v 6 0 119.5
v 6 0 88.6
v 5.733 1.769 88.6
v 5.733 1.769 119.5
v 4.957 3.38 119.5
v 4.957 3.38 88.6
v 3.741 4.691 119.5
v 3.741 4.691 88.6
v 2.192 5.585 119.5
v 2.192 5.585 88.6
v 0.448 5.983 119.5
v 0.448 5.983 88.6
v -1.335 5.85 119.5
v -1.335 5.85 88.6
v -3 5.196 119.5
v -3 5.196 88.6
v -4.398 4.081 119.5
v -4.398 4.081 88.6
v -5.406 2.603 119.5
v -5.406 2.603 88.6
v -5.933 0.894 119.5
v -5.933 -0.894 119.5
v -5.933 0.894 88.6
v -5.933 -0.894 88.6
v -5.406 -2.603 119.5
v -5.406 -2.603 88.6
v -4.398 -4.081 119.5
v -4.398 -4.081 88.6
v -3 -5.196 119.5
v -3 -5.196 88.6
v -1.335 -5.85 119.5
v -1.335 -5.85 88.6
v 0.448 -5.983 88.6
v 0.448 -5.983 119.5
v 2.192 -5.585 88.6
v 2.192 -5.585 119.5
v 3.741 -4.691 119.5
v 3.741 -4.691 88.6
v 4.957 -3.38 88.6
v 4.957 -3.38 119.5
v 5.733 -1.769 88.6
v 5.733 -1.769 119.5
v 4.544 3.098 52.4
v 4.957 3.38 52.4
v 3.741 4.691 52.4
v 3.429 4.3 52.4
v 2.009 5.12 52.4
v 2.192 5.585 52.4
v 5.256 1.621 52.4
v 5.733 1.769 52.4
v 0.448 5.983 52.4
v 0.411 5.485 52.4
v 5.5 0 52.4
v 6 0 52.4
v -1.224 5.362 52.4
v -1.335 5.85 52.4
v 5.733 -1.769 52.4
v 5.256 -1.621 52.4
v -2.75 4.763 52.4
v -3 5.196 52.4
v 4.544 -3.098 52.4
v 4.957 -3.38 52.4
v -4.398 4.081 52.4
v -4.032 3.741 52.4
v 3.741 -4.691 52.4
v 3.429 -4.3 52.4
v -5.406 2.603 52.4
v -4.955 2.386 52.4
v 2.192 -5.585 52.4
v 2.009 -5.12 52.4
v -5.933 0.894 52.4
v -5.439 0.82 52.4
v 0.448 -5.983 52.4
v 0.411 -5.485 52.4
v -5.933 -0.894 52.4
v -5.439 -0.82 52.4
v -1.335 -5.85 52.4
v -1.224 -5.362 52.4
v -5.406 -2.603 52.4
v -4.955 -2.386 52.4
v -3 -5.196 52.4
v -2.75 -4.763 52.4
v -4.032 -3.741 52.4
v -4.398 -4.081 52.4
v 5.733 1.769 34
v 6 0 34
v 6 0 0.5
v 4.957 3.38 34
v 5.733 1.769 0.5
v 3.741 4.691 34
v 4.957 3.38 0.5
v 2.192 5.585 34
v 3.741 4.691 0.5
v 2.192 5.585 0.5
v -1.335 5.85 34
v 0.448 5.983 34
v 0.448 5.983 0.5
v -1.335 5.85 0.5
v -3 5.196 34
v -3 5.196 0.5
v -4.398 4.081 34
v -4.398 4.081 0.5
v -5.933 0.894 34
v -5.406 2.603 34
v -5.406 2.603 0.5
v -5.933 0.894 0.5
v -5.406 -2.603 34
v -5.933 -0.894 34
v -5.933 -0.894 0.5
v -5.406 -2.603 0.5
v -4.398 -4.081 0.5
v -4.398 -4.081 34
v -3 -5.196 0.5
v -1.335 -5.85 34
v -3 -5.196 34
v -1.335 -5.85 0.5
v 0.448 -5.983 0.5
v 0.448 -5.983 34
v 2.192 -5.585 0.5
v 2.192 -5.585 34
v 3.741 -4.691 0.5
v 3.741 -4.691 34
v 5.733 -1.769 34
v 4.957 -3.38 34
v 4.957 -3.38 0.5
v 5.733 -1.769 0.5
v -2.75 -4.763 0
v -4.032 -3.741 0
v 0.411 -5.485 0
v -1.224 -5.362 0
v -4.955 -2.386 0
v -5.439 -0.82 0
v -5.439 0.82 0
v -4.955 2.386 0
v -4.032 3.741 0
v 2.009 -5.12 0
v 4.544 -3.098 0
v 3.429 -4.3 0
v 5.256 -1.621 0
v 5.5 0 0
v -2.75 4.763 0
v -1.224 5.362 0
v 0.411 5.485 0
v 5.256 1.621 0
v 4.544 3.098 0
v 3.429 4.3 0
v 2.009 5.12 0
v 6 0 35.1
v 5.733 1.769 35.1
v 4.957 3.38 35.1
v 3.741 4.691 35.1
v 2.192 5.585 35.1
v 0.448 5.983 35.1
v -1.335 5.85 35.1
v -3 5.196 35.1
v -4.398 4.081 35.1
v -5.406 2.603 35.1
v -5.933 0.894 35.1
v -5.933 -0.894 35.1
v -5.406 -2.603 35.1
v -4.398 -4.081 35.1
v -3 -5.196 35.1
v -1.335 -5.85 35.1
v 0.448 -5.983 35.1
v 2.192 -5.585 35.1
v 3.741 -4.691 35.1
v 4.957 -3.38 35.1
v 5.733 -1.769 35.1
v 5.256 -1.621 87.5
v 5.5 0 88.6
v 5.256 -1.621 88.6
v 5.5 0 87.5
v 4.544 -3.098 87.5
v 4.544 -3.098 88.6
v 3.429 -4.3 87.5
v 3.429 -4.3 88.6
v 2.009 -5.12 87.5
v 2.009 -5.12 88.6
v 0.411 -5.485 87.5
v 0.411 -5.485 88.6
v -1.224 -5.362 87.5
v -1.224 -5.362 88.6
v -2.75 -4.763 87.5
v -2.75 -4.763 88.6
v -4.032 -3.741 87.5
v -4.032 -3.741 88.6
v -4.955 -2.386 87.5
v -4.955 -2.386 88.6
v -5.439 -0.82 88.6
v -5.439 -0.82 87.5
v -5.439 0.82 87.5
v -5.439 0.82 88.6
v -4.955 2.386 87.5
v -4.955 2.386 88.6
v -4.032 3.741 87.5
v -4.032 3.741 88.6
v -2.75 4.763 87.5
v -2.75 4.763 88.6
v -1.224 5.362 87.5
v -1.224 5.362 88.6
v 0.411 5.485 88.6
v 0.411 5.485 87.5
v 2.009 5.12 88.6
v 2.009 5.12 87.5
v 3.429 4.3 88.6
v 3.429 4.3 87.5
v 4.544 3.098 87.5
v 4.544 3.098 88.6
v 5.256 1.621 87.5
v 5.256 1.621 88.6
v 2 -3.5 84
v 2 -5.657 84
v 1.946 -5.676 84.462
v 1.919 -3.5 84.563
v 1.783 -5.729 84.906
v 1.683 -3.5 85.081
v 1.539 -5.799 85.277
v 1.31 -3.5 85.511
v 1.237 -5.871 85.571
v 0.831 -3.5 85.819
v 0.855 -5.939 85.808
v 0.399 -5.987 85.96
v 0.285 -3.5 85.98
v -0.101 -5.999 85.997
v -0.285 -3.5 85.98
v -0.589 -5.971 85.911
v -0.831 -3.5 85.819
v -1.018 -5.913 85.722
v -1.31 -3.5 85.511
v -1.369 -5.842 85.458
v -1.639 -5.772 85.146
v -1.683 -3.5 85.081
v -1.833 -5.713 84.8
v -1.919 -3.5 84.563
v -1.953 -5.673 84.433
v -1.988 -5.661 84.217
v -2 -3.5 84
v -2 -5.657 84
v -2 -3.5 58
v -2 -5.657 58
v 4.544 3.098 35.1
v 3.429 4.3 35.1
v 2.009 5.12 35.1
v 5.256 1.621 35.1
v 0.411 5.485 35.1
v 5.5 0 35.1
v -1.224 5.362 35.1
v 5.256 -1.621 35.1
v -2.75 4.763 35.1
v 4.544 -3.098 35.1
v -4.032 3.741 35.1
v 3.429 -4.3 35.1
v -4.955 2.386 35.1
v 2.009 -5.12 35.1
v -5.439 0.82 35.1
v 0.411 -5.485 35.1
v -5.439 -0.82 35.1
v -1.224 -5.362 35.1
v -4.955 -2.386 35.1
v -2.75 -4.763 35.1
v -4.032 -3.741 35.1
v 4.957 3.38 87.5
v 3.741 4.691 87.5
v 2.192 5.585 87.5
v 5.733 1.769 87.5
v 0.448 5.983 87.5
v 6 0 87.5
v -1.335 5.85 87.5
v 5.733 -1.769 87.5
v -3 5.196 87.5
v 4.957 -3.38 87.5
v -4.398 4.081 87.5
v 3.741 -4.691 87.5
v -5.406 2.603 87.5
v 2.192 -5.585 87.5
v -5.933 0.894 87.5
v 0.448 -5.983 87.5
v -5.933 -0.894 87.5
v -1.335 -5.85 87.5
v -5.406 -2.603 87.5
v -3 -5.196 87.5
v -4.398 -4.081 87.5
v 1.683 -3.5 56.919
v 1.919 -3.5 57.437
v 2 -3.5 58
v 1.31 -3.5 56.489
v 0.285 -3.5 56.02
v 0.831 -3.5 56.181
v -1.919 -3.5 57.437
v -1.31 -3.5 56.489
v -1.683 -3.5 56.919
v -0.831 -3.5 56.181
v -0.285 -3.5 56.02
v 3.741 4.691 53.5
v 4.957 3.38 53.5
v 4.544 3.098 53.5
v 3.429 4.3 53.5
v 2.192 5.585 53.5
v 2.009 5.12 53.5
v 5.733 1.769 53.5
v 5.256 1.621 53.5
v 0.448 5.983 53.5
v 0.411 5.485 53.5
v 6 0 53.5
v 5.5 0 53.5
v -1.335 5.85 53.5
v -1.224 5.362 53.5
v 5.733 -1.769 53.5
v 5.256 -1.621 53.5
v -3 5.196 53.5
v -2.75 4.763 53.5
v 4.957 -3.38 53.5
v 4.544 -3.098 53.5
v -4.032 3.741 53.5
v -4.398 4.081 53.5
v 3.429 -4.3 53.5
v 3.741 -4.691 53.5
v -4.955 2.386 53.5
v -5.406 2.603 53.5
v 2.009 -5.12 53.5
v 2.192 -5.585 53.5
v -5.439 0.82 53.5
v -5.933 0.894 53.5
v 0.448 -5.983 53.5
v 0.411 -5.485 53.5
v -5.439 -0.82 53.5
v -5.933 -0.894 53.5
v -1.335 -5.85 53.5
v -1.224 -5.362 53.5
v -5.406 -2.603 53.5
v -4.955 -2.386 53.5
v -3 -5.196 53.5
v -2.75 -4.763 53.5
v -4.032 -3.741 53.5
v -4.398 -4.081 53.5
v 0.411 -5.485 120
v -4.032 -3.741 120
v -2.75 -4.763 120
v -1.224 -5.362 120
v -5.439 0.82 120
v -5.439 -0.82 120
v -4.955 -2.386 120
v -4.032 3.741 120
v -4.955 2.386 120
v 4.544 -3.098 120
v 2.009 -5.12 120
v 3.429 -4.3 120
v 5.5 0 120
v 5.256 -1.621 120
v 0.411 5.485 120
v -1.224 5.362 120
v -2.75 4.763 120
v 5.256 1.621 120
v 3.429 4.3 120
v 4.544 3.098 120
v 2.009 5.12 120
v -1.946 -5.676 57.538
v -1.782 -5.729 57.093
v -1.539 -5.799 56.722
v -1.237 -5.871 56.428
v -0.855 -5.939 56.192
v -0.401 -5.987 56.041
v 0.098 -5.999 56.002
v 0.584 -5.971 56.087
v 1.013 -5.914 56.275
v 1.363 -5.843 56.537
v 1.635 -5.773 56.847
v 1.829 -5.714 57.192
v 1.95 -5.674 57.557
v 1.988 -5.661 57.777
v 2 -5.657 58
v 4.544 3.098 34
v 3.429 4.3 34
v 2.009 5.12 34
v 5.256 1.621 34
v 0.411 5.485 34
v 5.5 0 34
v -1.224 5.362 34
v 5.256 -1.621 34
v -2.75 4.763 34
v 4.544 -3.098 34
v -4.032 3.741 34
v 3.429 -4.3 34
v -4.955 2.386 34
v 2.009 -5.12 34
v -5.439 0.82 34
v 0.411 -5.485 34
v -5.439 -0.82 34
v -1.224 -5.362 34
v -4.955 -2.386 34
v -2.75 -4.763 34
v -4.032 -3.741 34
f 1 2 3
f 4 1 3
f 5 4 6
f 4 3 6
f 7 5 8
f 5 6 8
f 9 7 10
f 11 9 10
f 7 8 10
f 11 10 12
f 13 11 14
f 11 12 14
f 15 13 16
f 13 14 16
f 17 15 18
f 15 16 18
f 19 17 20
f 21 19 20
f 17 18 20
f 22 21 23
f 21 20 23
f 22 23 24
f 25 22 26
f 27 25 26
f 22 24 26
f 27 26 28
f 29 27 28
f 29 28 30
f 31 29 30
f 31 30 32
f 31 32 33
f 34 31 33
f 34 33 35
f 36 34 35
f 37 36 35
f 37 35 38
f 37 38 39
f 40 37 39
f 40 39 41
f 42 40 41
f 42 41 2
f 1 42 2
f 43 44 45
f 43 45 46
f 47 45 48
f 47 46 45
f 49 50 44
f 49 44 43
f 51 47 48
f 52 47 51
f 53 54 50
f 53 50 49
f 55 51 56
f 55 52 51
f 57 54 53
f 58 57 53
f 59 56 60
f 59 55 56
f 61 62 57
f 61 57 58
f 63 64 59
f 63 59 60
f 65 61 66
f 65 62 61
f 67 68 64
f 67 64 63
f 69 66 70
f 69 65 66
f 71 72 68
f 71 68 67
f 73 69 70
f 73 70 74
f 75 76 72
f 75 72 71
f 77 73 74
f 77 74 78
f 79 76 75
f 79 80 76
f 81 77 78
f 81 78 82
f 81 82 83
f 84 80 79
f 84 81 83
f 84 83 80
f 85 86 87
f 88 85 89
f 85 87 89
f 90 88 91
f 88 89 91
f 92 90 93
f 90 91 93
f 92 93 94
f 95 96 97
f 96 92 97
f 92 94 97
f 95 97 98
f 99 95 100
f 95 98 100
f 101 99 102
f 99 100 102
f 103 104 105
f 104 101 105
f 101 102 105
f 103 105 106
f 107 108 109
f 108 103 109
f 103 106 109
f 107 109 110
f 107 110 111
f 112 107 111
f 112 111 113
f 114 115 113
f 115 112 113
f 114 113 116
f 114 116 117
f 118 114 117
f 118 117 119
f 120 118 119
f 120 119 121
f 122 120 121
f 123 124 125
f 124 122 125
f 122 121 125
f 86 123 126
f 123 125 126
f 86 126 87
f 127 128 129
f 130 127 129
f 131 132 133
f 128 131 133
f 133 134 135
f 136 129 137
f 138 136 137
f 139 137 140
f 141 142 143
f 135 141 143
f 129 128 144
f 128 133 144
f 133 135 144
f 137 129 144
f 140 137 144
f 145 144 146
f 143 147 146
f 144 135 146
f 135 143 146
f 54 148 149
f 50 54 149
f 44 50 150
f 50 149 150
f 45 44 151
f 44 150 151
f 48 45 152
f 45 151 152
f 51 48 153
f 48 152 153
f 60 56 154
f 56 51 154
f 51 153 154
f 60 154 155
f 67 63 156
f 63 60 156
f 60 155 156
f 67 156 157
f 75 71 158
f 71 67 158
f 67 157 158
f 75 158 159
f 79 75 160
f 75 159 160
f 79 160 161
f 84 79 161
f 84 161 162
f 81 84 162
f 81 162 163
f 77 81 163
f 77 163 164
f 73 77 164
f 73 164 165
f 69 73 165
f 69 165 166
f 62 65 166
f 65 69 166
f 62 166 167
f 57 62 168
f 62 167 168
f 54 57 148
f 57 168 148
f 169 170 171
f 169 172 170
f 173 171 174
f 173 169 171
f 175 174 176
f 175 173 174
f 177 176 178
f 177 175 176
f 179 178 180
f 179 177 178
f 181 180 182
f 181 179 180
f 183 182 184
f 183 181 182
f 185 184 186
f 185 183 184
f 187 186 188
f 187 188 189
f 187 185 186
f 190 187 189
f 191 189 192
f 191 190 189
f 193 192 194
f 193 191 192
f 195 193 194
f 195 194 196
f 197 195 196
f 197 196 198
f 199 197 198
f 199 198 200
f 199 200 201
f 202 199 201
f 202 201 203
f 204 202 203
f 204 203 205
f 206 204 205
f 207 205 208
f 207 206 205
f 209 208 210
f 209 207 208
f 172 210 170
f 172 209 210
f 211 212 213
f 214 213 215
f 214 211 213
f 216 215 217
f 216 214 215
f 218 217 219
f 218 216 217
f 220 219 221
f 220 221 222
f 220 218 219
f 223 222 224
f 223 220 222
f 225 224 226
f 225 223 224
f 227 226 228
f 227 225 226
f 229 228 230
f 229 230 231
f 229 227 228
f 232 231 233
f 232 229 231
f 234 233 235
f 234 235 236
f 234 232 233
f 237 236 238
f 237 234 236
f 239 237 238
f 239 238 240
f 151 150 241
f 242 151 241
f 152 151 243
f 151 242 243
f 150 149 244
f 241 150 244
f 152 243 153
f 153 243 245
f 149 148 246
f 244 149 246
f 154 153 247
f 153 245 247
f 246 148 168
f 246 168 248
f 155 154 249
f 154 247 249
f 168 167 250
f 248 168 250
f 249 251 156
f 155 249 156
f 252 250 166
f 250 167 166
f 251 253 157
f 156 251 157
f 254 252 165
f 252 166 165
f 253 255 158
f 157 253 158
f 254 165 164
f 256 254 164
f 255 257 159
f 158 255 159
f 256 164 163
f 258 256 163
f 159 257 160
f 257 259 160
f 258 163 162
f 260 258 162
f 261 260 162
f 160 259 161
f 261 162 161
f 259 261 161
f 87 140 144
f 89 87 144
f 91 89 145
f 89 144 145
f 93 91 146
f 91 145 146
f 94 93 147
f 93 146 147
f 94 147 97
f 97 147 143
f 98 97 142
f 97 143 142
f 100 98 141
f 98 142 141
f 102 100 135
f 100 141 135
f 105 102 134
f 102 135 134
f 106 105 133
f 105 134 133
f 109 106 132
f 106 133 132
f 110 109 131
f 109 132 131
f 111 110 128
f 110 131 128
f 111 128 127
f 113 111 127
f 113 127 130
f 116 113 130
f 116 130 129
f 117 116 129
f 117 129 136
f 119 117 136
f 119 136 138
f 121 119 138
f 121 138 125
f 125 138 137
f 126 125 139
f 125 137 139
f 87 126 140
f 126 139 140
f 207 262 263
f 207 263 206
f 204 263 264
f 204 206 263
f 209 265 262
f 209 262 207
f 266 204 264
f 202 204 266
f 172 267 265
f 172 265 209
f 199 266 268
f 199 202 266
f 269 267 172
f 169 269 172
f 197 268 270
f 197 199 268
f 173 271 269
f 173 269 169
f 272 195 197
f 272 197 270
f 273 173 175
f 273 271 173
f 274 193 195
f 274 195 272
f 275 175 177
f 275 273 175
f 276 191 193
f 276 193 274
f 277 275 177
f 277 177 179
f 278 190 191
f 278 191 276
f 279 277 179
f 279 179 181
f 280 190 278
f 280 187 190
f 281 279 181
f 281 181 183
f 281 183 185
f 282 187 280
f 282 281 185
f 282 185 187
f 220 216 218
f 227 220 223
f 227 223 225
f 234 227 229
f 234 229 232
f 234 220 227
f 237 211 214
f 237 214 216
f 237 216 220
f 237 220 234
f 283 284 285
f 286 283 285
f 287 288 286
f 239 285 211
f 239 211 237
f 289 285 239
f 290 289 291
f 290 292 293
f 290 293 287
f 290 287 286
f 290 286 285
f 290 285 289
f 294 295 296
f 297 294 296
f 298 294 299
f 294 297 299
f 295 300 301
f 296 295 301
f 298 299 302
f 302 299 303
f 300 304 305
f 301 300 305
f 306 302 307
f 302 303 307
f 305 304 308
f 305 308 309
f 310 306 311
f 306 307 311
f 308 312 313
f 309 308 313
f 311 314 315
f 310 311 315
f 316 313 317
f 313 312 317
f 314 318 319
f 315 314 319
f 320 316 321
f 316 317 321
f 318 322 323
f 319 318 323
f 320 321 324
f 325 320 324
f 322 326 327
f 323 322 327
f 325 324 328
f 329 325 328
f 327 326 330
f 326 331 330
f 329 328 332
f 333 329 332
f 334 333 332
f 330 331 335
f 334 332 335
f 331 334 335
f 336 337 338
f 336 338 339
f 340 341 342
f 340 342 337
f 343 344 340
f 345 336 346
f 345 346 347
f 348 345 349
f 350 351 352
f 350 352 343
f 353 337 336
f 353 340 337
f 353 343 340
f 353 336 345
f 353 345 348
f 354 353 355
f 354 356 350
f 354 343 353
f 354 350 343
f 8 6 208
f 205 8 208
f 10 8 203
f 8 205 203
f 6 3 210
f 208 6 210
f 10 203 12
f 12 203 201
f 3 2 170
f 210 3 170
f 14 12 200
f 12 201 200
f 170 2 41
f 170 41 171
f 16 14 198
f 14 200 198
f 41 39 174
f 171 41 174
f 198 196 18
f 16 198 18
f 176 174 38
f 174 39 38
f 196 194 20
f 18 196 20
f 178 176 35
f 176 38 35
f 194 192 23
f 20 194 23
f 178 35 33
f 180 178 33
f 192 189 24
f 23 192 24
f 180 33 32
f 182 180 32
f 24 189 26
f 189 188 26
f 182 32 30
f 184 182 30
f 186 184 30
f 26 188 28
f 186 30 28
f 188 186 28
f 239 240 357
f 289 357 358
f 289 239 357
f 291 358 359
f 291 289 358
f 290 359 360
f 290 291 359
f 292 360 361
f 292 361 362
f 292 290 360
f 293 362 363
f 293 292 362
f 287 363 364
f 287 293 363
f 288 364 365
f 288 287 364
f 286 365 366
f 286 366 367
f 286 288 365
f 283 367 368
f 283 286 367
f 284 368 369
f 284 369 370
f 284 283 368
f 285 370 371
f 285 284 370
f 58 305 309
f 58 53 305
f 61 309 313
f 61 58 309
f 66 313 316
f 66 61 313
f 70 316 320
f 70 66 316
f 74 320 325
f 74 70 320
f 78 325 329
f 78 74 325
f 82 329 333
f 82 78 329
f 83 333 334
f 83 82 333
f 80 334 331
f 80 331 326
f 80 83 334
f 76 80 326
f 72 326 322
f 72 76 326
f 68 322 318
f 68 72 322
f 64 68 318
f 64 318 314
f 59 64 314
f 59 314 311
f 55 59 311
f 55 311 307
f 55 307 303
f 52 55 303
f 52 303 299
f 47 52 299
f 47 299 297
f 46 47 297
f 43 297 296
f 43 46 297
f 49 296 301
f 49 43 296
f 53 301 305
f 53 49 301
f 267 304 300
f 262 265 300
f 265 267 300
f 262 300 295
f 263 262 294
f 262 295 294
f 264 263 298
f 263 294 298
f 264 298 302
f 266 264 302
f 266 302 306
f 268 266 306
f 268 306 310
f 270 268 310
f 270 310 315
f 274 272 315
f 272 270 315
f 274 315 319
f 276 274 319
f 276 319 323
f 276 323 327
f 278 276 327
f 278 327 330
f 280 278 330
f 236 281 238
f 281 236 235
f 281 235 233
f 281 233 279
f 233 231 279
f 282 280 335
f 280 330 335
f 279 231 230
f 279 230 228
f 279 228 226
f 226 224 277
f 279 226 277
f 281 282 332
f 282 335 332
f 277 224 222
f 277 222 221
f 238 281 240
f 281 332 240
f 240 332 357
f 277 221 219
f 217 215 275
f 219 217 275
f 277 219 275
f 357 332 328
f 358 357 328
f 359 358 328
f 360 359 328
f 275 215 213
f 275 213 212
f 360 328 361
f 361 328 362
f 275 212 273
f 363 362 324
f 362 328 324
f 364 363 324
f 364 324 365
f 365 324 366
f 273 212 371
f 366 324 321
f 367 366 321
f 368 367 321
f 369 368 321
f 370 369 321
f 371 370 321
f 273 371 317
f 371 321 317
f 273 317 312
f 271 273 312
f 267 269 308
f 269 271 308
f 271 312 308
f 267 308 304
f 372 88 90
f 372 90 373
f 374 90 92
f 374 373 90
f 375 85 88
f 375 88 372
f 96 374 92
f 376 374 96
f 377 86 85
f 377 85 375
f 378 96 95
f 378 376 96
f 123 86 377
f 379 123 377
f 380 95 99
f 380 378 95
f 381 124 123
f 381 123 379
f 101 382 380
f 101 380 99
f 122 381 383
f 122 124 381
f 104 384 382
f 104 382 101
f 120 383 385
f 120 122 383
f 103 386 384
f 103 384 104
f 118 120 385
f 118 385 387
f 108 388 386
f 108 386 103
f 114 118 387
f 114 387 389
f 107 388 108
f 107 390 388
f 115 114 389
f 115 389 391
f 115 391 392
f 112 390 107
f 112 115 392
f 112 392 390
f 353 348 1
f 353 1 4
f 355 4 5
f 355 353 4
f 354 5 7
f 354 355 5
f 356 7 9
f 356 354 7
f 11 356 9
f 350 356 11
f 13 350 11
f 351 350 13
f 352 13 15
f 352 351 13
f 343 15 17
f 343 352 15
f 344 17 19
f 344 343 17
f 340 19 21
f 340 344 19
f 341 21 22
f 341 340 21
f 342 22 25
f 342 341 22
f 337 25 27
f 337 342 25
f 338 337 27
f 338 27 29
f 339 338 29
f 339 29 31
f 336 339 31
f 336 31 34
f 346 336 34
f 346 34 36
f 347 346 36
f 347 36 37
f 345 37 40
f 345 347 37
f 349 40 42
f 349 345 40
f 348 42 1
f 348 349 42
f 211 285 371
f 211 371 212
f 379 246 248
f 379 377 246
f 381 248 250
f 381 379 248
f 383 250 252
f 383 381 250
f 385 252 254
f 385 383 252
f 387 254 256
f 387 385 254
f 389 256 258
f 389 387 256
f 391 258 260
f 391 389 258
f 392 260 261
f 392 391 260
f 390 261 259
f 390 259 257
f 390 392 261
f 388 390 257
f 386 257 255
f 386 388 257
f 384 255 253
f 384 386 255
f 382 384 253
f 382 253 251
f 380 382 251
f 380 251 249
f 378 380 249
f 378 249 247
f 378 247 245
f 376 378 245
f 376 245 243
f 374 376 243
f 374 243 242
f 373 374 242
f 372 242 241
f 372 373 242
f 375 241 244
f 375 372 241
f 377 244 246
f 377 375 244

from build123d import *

# Parameters (mm, degrees)
SKETCH_1_R          = 6
EXTRUDE_1_DEPTH     = 120
CUT_EXTRUDE_START   = -3.5
CUT_EXTRUDE_1_DEPTH = 10
SKETCH_3_W          = 1.1
SKETCH_3_H          = 0.5
CHAMFER_1_SIZE      = 0.5


with BuildPart() as part:
    # 草图1 → 凸台-拉伸1 (new body)
    with BuildSketch(Plane.XY):
        Circle(SKETCH_1_R)
    extrude(amount=EXTRUDE_1_DEPTH)

    # 草图2 → 切除-拉伸1 (cut)
    with BuildSketch(Plane(origin=(0, 0, 0), x_dir=(1, 0, 0), z_dir=(0, 1, 0)).offset(CUT_EXTRUDE_START)):
        with BuildLine():
            Line((2, -58), (2, -84))
            ThreePointArc((2, -84), (0, -86), (-2, -84))
            Line((-2, -84), (-2, -58))
            ThreePointArc((-2, -58), (0, -56), (2, -58))
        make_face()
    extrude(amount=-CUT_EXTRUDE_1_DEPTH, mode=Mode.SUBTRACT)

    # 草图3 → 切除-旋转1 (revolve, cut)
    with BuildSketch(Plane(origin=(0, 0, 0), x_dir=(0, 0, -1), z_dir=(1, 0, 0)), mode=Mode.PRIVATE) as cut_revolve_1_sk:
        with Locations((-88.05, 5.75)):
            Rectangle(SKETCH_3_W, SKETCH_3_H)
        with Locations((-34.55, 5.75)):
            Rectangle(SKETCH_3_W, SKETCH_3_H)
        with Locations((-52.95, 5.75)):
            Rectangle(SKETCH_3_W, SKETCH_3_H)
    revolve(cut_revolve_1_sk.sketch.rotate(Axis((0, 0, 130.661115057), (0, 0, -1)), 90), axis=Axis((0, 0, 130.661115057), (0, 0, -1)), mode=Mode.SUBTRACT)

    # 倒角1
    chamfer_1_edges = [part.edges().sort_by_distance(p)[0] for p in [
        (-6, 0, 0),
        (-6, 0, 120),
    ]]
    chamfer(chamfer_1_edges, length=CHAMFER_1_SIZE)


solid = part.part
